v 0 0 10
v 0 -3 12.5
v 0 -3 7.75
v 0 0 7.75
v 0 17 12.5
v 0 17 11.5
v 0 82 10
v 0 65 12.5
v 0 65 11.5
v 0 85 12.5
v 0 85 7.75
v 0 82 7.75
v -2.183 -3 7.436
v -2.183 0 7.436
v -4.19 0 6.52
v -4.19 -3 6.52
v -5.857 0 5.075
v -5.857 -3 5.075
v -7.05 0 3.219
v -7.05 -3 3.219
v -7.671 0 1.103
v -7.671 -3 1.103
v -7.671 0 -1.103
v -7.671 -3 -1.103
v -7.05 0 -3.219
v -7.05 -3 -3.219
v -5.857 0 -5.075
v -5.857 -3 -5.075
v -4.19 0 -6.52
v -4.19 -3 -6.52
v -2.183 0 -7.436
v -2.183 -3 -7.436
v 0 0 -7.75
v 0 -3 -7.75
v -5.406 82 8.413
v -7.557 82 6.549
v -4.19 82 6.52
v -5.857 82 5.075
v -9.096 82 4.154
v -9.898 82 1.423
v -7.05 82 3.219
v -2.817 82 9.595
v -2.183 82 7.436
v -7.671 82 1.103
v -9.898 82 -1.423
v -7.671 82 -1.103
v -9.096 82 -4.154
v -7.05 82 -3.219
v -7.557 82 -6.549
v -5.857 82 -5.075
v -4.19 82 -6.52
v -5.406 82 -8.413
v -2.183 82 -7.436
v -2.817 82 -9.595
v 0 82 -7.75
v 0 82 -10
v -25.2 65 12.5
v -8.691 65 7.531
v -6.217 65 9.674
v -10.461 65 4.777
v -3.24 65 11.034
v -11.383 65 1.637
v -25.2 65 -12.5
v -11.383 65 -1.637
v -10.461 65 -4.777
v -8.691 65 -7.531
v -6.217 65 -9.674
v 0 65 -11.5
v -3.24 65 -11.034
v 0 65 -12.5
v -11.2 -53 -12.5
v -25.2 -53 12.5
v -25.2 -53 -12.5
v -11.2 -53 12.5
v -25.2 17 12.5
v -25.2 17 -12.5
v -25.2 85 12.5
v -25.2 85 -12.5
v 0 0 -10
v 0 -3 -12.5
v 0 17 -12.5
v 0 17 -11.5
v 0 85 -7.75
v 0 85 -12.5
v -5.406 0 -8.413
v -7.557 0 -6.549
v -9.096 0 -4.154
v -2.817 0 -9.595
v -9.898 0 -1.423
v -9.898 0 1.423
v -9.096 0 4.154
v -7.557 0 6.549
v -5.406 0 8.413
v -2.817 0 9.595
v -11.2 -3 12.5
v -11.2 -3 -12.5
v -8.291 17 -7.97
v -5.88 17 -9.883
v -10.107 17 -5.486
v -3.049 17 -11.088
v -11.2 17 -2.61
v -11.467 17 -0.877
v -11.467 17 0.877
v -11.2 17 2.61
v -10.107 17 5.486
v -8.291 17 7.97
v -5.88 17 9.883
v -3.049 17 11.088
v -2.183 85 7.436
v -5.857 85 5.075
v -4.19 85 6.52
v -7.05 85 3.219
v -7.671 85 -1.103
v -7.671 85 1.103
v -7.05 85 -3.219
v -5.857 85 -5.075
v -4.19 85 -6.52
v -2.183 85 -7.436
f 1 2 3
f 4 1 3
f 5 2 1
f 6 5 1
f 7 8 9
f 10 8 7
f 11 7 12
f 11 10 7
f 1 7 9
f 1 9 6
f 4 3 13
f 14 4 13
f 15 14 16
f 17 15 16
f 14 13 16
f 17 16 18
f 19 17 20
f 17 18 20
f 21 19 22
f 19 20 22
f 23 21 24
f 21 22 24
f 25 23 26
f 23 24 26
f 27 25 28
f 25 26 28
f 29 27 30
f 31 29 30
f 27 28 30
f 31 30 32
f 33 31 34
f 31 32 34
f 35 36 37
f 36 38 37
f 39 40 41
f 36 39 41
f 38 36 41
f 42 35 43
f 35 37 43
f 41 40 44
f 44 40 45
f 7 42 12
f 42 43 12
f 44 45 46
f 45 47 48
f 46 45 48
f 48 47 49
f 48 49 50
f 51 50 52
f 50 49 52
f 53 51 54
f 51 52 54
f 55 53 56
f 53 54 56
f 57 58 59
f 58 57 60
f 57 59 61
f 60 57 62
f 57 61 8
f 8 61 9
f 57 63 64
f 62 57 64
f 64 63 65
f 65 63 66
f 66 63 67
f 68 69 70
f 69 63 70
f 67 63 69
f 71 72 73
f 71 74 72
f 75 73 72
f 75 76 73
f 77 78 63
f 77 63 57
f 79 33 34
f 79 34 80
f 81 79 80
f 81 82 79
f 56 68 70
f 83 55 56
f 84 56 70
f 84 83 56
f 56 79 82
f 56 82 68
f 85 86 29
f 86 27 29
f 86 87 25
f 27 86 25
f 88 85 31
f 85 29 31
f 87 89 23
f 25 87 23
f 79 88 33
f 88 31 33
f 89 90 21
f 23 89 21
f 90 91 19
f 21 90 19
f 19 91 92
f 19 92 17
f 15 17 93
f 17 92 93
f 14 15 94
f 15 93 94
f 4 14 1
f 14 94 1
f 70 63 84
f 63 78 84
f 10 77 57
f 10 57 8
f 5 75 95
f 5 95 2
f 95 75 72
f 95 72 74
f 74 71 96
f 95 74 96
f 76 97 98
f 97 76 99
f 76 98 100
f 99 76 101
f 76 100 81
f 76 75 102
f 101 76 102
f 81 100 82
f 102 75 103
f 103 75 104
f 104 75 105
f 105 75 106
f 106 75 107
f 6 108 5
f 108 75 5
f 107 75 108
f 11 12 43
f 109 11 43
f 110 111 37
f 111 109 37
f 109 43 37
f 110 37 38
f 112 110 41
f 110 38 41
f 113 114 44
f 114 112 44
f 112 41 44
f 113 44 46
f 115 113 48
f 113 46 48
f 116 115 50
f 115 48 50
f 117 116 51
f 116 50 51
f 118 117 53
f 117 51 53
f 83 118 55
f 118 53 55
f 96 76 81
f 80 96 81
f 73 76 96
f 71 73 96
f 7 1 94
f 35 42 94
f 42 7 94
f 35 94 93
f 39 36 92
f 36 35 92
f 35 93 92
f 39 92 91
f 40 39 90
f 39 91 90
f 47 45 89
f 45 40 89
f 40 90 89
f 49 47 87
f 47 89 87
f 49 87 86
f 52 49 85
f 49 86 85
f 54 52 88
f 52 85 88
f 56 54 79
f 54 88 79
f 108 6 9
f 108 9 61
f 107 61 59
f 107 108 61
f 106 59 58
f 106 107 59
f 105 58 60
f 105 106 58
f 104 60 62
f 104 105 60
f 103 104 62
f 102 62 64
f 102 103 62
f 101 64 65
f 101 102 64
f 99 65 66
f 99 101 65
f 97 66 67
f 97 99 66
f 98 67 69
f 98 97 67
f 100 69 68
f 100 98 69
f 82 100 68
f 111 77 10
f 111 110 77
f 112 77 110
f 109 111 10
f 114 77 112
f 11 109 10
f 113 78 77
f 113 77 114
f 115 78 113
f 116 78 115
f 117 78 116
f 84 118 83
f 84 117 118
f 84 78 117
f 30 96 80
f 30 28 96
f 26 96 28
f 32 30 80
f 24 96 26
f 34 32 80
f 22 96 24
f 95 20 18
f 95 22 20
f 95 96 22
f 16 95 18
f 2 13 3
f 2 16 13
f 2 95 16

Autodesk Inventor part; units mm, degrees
ref_plane "YZ Plane" through (0, 0, 0) normal (1, 0, 0) x (0, 1, 0)
ref_plane "XZ Plane" through (0, 0, 0) normal (0, 1, 0) x (-1, 0, 0)
ref_plane "XY Plane" through (0, 0, 0) normal (0, 0, 1) x (1, 0, 0)
sketch "草圖1" plane through (0, 0, 0) normal (0, 1, 0) x (-1, 0, 0)
  arc A0 (0, -10) -> (0, 10) centre (0, 0) ccw
  arc A1 (0, -11.5) -> (0, 11.5) centre (0, 0) ccw
  line L0 (0, 11.5) -> (0, 10)
  line L1 (0, -10) -> (0, -11.5)
  dimension "d0" = 20
  dimension "d1" = 23
extrude "擠出1" add sketch "草圖1" along normal blind 40
sketch "草圖2" plane through (0, 40, 0) normal (0, 1, 0) x (1, 0, 0)
  line L0 (0, -11.5) -> (0, -10) projected
  arc A0 (0, 11.5) -> (0, -11.5) centre (0, 0) ccw projected
  line L1 (0, 10) -> (0, 11.5) projected
  line L2 (0, -10) -> (0, 10)
extrude "擠出2" add sketch "草圖2" along normal blind 3
sketch "草圖3" plane through (0, 43, 0) normal (0, 1, 0) x (1, 0, 0)
  arc A0 (0, 7.75) -> (0, -7.75) centre (0, 0) ccw
  line L0 (0, -10) -> (0, 10) projected
  line L1 (0, -7.75) -> (0, 7.75)
  dimension "d7" = 15.5
extrude "擠出3" cut sketch "草圖3" against normal up to next
sketch "草圖5" plane through (0, 0, 0) normal (0, -1, 0) x (1, 0, 0)
  arc A0 (0, 10) -> (0, -10) centre (0, 0) ccw projected
  line L0 (0, 10) -> (0, 11.5) projected
  arc A1 (0, 11.5) -> (0, -11.5) centre (0, 0) ccw projected
  line L1 (0, -11.5) -> (0, -10) projected
  line L2 (0, 11.5) -> (0, -11.5)
extrude "擠出4" add sketch "草圖5" along normal blind 3
sketch "草圖7" plane through (0, -3, 0) normal (0, -1, 0) x (1, 0, 0)
  arc A0 (0, 7.75) -> (0, -7.75) centre (0, 0) ccw
  line L0 (0, -11.5) -> (0, 11.5) projected
  line L1 (0, -7.75) -> (0, 7.75)
  dimension "d13" = 15.5
extrude "擠出5" cut sketch "草圖7" against normal up to next
sketch "草圖9" plane through (0, 0, 0) normal (0, 0, 1) x (1, 0, 0)
  line L0 (0, 43) -> (0, -3) construction
  line L1 (0, -3) -> (-11.2, -3) construction
  line L2 (-11.5, -3) -> (0, -3) construction
  line L3 (-11.2, -3) -> (-11.2, -103) construction
  line L4 (-11.2, -3) -> (-11.2, 17) construction
  line L5 (-11.2, 17) -> (-16.2, 17)
  line L6 (-16.2, 17) -> (-16.2, -123)
  line L7 (-16.2, -123) -> (-11.2, -123)
  line L8 (-11.2, -123) -> (-11.2, 17)
  point P0 (0, 0)
  dimension "d18" = 11.2
  dimension "d19" = 100
  dimension "d20" = 20
  dimension "d21" = 5
  dimension "d22" = 140
  dimension "d23" = 5
extrude "擠出6" add sketch "草圖9" along normal mid plane 25
sketch "草圖11" plane through (0, -3, 0) normal (0, -1, 0) x (1, 0, 0)
  line L0 (-16.2, -12.5) -> (-11.2, -12.5) projected
  line L1 (-16.2, -12.5) -> (0, -12.5)
  line L2 (-11.2, -12.5) -> (-16.2, -12.5) projected
  line L3 (-16.2, -12.5) -> (-16.2, 12.5) projected
  line L4 (-16.2, 12.5) -> (-11.2, 12.5) projected
  line L5 (-11.2, 12.5) -> (0, 12.5)
  line L6 (0, 12.5) -> (0, 11.5)
  arc A0 (-11.2, -2.6096) -> (0, -11.5) centre (0, 0) ccw projected
  arc A1 (0, 11.5) -> (-11.2, 2.6096) centre (0, 0) ccw projected
  line L7 (-11.2, -12.5) -> (-11.2, 12.5) projected
  line L8 (0, -12.5) -> (0, -11.5)
extrude "擠出7" add sketch "草圖11" against normal blind 20 contours L7 A0 L8 L1 | L5 L6 A1 L7
sketch "草圖12" plane through (-11.2, -123, 12.5) normal (1, 0, 0) x (0, 0, -1)
  line L0 (20.25, 120) -> (4.75, 120) construction
  line L1 (25, 120) -> (0, 120) projected
  line L2 (0, 0) -> (0, 120) projected
  line L3 (25, 0) -> (0, 0) projected
  line L4 (25, 120) -> (25, 0) projected
  line L5 (0, 120) -> (0, 70) construction
  line L6 (0, 70) -> (25, 70)
  point P0 (12.5, 123)
  dimension "d36" = 50
extrude "擠出9" cut sketch "草圖12" against normal up to next contours L4 L3 L2 L6
sketch "草圖16" plane through (0, 43, 0) normal (0, 1, 0) x (1, 0, 0)
  arc A0 (0, 10) -> (0, -10) centre (0, 0) ccw projected
  arc A1 (0, 11.5) -> (0, -11.5) centre (0, 0) ccw projected
  line L0 (0, -11.5) -> (0, -7.75) projected
  line L1 (0, 7.75) -> (0, 11.5) projected
extrude "擠出11" add sketch "草圖16" along normal blind 39
sketch "草圖17" plane through (0, 82, 0) normal (0, 1, 0) x (1, 0, 0)
  line L0 (0, -10) -> (0, -7.75) projected
  arc A0 (0, 7.75) -> (0, -7.75) centre (0, 0) ccw projected
  line L1 (0, 7.75) -> (0, 10) projected
  arc A1 (0, 11.5) -> (0, -11.5) centre (0, 0) ccw projected
  line L2 (0, -11.5) -> (0, -10) projected
  line L3 (0, 10) -> (0, 11.5) projected
extrude "擠出12" add sketch "草圖17" along normal blind 3
sketch "草圖18" plane through (0, 85, 0) normal (0, 1, 0) x (1, 0, 0)
  arc A0 (0, 11.5) -> (0, -11.5) centre (0, 0) ccw projected
  line L0 (0, 11.5) -> (0, 12.5) projected
  line L1 (-16.2, 12.5) -> (0, 12.5) projected
  line L2 (-16.2, 12.5) -> (-16.2, -12.5) projected
  line L3 (-16.2, -12.5) -> (0, -12.5) projected
  line L4 (0, -12.5) -> (0, -11.5) projected
extrude "擠出13" add sketch "草圖18" against normal blind 20
sketch "草圖19" plane through (0, 43, 0) normal (0, 1, 0) x (1, 0, 0)
  arc A0 (0, 10) -> (0, -10) centre (0, 0) ccw projected
  line L0 (0, -10) -> (0, -7.75) projected
  arc A1 (0, 7.75) -> (0, -7.75) centre (0, 0) ccw projected
  line L1 (0, 7.75) -> (0, 10) projected
extrude "擠出14" cut sketch "草圖19" against normal blind 3
sketch "Sketch20" plane through (0, 0, 0) normal (0, 0, 1) x (1, 0, 0)
  line L0 (-11.2, -3) -> (0, -3) projected
  line L1 (0, 85) -> (-16.2, 85) projected
  point P0 (0, 0)
  dimension "d52" = 88
sketch "Sketch21" plane through (-16.2, 85, -12.5) normal (-1, 0, 0) x (0, 0, 1)
  line L0 (25, 0) -> (20.25, 0) projected
  line L1 (0, -20) -> (1, -20) projected
  line L2 (25, 0) -> (0, 0)
  line L3 (0, 0) -> (0, -20)
  line L4 (0, -20) -> (25, -20)
  line L5 (25, -20) -> (25, 0)
  line L6 (25, -68) -> (25, -138) projected
  line L7 (0, -138) -> (25, -138) projected
  line L8 (25, -68) -> (0, -68)
  line L9 (0, -68) -> (0, -138)
  line L10 (0, -138) -> (25, -138)
  line L11 (25, -138) -> (25, -68)
  point P0 (12.5, -85)
extrude "Extrusion15" add sketch "Sketch21" along normal blind 9
properties part number "蓋子加平面2"
